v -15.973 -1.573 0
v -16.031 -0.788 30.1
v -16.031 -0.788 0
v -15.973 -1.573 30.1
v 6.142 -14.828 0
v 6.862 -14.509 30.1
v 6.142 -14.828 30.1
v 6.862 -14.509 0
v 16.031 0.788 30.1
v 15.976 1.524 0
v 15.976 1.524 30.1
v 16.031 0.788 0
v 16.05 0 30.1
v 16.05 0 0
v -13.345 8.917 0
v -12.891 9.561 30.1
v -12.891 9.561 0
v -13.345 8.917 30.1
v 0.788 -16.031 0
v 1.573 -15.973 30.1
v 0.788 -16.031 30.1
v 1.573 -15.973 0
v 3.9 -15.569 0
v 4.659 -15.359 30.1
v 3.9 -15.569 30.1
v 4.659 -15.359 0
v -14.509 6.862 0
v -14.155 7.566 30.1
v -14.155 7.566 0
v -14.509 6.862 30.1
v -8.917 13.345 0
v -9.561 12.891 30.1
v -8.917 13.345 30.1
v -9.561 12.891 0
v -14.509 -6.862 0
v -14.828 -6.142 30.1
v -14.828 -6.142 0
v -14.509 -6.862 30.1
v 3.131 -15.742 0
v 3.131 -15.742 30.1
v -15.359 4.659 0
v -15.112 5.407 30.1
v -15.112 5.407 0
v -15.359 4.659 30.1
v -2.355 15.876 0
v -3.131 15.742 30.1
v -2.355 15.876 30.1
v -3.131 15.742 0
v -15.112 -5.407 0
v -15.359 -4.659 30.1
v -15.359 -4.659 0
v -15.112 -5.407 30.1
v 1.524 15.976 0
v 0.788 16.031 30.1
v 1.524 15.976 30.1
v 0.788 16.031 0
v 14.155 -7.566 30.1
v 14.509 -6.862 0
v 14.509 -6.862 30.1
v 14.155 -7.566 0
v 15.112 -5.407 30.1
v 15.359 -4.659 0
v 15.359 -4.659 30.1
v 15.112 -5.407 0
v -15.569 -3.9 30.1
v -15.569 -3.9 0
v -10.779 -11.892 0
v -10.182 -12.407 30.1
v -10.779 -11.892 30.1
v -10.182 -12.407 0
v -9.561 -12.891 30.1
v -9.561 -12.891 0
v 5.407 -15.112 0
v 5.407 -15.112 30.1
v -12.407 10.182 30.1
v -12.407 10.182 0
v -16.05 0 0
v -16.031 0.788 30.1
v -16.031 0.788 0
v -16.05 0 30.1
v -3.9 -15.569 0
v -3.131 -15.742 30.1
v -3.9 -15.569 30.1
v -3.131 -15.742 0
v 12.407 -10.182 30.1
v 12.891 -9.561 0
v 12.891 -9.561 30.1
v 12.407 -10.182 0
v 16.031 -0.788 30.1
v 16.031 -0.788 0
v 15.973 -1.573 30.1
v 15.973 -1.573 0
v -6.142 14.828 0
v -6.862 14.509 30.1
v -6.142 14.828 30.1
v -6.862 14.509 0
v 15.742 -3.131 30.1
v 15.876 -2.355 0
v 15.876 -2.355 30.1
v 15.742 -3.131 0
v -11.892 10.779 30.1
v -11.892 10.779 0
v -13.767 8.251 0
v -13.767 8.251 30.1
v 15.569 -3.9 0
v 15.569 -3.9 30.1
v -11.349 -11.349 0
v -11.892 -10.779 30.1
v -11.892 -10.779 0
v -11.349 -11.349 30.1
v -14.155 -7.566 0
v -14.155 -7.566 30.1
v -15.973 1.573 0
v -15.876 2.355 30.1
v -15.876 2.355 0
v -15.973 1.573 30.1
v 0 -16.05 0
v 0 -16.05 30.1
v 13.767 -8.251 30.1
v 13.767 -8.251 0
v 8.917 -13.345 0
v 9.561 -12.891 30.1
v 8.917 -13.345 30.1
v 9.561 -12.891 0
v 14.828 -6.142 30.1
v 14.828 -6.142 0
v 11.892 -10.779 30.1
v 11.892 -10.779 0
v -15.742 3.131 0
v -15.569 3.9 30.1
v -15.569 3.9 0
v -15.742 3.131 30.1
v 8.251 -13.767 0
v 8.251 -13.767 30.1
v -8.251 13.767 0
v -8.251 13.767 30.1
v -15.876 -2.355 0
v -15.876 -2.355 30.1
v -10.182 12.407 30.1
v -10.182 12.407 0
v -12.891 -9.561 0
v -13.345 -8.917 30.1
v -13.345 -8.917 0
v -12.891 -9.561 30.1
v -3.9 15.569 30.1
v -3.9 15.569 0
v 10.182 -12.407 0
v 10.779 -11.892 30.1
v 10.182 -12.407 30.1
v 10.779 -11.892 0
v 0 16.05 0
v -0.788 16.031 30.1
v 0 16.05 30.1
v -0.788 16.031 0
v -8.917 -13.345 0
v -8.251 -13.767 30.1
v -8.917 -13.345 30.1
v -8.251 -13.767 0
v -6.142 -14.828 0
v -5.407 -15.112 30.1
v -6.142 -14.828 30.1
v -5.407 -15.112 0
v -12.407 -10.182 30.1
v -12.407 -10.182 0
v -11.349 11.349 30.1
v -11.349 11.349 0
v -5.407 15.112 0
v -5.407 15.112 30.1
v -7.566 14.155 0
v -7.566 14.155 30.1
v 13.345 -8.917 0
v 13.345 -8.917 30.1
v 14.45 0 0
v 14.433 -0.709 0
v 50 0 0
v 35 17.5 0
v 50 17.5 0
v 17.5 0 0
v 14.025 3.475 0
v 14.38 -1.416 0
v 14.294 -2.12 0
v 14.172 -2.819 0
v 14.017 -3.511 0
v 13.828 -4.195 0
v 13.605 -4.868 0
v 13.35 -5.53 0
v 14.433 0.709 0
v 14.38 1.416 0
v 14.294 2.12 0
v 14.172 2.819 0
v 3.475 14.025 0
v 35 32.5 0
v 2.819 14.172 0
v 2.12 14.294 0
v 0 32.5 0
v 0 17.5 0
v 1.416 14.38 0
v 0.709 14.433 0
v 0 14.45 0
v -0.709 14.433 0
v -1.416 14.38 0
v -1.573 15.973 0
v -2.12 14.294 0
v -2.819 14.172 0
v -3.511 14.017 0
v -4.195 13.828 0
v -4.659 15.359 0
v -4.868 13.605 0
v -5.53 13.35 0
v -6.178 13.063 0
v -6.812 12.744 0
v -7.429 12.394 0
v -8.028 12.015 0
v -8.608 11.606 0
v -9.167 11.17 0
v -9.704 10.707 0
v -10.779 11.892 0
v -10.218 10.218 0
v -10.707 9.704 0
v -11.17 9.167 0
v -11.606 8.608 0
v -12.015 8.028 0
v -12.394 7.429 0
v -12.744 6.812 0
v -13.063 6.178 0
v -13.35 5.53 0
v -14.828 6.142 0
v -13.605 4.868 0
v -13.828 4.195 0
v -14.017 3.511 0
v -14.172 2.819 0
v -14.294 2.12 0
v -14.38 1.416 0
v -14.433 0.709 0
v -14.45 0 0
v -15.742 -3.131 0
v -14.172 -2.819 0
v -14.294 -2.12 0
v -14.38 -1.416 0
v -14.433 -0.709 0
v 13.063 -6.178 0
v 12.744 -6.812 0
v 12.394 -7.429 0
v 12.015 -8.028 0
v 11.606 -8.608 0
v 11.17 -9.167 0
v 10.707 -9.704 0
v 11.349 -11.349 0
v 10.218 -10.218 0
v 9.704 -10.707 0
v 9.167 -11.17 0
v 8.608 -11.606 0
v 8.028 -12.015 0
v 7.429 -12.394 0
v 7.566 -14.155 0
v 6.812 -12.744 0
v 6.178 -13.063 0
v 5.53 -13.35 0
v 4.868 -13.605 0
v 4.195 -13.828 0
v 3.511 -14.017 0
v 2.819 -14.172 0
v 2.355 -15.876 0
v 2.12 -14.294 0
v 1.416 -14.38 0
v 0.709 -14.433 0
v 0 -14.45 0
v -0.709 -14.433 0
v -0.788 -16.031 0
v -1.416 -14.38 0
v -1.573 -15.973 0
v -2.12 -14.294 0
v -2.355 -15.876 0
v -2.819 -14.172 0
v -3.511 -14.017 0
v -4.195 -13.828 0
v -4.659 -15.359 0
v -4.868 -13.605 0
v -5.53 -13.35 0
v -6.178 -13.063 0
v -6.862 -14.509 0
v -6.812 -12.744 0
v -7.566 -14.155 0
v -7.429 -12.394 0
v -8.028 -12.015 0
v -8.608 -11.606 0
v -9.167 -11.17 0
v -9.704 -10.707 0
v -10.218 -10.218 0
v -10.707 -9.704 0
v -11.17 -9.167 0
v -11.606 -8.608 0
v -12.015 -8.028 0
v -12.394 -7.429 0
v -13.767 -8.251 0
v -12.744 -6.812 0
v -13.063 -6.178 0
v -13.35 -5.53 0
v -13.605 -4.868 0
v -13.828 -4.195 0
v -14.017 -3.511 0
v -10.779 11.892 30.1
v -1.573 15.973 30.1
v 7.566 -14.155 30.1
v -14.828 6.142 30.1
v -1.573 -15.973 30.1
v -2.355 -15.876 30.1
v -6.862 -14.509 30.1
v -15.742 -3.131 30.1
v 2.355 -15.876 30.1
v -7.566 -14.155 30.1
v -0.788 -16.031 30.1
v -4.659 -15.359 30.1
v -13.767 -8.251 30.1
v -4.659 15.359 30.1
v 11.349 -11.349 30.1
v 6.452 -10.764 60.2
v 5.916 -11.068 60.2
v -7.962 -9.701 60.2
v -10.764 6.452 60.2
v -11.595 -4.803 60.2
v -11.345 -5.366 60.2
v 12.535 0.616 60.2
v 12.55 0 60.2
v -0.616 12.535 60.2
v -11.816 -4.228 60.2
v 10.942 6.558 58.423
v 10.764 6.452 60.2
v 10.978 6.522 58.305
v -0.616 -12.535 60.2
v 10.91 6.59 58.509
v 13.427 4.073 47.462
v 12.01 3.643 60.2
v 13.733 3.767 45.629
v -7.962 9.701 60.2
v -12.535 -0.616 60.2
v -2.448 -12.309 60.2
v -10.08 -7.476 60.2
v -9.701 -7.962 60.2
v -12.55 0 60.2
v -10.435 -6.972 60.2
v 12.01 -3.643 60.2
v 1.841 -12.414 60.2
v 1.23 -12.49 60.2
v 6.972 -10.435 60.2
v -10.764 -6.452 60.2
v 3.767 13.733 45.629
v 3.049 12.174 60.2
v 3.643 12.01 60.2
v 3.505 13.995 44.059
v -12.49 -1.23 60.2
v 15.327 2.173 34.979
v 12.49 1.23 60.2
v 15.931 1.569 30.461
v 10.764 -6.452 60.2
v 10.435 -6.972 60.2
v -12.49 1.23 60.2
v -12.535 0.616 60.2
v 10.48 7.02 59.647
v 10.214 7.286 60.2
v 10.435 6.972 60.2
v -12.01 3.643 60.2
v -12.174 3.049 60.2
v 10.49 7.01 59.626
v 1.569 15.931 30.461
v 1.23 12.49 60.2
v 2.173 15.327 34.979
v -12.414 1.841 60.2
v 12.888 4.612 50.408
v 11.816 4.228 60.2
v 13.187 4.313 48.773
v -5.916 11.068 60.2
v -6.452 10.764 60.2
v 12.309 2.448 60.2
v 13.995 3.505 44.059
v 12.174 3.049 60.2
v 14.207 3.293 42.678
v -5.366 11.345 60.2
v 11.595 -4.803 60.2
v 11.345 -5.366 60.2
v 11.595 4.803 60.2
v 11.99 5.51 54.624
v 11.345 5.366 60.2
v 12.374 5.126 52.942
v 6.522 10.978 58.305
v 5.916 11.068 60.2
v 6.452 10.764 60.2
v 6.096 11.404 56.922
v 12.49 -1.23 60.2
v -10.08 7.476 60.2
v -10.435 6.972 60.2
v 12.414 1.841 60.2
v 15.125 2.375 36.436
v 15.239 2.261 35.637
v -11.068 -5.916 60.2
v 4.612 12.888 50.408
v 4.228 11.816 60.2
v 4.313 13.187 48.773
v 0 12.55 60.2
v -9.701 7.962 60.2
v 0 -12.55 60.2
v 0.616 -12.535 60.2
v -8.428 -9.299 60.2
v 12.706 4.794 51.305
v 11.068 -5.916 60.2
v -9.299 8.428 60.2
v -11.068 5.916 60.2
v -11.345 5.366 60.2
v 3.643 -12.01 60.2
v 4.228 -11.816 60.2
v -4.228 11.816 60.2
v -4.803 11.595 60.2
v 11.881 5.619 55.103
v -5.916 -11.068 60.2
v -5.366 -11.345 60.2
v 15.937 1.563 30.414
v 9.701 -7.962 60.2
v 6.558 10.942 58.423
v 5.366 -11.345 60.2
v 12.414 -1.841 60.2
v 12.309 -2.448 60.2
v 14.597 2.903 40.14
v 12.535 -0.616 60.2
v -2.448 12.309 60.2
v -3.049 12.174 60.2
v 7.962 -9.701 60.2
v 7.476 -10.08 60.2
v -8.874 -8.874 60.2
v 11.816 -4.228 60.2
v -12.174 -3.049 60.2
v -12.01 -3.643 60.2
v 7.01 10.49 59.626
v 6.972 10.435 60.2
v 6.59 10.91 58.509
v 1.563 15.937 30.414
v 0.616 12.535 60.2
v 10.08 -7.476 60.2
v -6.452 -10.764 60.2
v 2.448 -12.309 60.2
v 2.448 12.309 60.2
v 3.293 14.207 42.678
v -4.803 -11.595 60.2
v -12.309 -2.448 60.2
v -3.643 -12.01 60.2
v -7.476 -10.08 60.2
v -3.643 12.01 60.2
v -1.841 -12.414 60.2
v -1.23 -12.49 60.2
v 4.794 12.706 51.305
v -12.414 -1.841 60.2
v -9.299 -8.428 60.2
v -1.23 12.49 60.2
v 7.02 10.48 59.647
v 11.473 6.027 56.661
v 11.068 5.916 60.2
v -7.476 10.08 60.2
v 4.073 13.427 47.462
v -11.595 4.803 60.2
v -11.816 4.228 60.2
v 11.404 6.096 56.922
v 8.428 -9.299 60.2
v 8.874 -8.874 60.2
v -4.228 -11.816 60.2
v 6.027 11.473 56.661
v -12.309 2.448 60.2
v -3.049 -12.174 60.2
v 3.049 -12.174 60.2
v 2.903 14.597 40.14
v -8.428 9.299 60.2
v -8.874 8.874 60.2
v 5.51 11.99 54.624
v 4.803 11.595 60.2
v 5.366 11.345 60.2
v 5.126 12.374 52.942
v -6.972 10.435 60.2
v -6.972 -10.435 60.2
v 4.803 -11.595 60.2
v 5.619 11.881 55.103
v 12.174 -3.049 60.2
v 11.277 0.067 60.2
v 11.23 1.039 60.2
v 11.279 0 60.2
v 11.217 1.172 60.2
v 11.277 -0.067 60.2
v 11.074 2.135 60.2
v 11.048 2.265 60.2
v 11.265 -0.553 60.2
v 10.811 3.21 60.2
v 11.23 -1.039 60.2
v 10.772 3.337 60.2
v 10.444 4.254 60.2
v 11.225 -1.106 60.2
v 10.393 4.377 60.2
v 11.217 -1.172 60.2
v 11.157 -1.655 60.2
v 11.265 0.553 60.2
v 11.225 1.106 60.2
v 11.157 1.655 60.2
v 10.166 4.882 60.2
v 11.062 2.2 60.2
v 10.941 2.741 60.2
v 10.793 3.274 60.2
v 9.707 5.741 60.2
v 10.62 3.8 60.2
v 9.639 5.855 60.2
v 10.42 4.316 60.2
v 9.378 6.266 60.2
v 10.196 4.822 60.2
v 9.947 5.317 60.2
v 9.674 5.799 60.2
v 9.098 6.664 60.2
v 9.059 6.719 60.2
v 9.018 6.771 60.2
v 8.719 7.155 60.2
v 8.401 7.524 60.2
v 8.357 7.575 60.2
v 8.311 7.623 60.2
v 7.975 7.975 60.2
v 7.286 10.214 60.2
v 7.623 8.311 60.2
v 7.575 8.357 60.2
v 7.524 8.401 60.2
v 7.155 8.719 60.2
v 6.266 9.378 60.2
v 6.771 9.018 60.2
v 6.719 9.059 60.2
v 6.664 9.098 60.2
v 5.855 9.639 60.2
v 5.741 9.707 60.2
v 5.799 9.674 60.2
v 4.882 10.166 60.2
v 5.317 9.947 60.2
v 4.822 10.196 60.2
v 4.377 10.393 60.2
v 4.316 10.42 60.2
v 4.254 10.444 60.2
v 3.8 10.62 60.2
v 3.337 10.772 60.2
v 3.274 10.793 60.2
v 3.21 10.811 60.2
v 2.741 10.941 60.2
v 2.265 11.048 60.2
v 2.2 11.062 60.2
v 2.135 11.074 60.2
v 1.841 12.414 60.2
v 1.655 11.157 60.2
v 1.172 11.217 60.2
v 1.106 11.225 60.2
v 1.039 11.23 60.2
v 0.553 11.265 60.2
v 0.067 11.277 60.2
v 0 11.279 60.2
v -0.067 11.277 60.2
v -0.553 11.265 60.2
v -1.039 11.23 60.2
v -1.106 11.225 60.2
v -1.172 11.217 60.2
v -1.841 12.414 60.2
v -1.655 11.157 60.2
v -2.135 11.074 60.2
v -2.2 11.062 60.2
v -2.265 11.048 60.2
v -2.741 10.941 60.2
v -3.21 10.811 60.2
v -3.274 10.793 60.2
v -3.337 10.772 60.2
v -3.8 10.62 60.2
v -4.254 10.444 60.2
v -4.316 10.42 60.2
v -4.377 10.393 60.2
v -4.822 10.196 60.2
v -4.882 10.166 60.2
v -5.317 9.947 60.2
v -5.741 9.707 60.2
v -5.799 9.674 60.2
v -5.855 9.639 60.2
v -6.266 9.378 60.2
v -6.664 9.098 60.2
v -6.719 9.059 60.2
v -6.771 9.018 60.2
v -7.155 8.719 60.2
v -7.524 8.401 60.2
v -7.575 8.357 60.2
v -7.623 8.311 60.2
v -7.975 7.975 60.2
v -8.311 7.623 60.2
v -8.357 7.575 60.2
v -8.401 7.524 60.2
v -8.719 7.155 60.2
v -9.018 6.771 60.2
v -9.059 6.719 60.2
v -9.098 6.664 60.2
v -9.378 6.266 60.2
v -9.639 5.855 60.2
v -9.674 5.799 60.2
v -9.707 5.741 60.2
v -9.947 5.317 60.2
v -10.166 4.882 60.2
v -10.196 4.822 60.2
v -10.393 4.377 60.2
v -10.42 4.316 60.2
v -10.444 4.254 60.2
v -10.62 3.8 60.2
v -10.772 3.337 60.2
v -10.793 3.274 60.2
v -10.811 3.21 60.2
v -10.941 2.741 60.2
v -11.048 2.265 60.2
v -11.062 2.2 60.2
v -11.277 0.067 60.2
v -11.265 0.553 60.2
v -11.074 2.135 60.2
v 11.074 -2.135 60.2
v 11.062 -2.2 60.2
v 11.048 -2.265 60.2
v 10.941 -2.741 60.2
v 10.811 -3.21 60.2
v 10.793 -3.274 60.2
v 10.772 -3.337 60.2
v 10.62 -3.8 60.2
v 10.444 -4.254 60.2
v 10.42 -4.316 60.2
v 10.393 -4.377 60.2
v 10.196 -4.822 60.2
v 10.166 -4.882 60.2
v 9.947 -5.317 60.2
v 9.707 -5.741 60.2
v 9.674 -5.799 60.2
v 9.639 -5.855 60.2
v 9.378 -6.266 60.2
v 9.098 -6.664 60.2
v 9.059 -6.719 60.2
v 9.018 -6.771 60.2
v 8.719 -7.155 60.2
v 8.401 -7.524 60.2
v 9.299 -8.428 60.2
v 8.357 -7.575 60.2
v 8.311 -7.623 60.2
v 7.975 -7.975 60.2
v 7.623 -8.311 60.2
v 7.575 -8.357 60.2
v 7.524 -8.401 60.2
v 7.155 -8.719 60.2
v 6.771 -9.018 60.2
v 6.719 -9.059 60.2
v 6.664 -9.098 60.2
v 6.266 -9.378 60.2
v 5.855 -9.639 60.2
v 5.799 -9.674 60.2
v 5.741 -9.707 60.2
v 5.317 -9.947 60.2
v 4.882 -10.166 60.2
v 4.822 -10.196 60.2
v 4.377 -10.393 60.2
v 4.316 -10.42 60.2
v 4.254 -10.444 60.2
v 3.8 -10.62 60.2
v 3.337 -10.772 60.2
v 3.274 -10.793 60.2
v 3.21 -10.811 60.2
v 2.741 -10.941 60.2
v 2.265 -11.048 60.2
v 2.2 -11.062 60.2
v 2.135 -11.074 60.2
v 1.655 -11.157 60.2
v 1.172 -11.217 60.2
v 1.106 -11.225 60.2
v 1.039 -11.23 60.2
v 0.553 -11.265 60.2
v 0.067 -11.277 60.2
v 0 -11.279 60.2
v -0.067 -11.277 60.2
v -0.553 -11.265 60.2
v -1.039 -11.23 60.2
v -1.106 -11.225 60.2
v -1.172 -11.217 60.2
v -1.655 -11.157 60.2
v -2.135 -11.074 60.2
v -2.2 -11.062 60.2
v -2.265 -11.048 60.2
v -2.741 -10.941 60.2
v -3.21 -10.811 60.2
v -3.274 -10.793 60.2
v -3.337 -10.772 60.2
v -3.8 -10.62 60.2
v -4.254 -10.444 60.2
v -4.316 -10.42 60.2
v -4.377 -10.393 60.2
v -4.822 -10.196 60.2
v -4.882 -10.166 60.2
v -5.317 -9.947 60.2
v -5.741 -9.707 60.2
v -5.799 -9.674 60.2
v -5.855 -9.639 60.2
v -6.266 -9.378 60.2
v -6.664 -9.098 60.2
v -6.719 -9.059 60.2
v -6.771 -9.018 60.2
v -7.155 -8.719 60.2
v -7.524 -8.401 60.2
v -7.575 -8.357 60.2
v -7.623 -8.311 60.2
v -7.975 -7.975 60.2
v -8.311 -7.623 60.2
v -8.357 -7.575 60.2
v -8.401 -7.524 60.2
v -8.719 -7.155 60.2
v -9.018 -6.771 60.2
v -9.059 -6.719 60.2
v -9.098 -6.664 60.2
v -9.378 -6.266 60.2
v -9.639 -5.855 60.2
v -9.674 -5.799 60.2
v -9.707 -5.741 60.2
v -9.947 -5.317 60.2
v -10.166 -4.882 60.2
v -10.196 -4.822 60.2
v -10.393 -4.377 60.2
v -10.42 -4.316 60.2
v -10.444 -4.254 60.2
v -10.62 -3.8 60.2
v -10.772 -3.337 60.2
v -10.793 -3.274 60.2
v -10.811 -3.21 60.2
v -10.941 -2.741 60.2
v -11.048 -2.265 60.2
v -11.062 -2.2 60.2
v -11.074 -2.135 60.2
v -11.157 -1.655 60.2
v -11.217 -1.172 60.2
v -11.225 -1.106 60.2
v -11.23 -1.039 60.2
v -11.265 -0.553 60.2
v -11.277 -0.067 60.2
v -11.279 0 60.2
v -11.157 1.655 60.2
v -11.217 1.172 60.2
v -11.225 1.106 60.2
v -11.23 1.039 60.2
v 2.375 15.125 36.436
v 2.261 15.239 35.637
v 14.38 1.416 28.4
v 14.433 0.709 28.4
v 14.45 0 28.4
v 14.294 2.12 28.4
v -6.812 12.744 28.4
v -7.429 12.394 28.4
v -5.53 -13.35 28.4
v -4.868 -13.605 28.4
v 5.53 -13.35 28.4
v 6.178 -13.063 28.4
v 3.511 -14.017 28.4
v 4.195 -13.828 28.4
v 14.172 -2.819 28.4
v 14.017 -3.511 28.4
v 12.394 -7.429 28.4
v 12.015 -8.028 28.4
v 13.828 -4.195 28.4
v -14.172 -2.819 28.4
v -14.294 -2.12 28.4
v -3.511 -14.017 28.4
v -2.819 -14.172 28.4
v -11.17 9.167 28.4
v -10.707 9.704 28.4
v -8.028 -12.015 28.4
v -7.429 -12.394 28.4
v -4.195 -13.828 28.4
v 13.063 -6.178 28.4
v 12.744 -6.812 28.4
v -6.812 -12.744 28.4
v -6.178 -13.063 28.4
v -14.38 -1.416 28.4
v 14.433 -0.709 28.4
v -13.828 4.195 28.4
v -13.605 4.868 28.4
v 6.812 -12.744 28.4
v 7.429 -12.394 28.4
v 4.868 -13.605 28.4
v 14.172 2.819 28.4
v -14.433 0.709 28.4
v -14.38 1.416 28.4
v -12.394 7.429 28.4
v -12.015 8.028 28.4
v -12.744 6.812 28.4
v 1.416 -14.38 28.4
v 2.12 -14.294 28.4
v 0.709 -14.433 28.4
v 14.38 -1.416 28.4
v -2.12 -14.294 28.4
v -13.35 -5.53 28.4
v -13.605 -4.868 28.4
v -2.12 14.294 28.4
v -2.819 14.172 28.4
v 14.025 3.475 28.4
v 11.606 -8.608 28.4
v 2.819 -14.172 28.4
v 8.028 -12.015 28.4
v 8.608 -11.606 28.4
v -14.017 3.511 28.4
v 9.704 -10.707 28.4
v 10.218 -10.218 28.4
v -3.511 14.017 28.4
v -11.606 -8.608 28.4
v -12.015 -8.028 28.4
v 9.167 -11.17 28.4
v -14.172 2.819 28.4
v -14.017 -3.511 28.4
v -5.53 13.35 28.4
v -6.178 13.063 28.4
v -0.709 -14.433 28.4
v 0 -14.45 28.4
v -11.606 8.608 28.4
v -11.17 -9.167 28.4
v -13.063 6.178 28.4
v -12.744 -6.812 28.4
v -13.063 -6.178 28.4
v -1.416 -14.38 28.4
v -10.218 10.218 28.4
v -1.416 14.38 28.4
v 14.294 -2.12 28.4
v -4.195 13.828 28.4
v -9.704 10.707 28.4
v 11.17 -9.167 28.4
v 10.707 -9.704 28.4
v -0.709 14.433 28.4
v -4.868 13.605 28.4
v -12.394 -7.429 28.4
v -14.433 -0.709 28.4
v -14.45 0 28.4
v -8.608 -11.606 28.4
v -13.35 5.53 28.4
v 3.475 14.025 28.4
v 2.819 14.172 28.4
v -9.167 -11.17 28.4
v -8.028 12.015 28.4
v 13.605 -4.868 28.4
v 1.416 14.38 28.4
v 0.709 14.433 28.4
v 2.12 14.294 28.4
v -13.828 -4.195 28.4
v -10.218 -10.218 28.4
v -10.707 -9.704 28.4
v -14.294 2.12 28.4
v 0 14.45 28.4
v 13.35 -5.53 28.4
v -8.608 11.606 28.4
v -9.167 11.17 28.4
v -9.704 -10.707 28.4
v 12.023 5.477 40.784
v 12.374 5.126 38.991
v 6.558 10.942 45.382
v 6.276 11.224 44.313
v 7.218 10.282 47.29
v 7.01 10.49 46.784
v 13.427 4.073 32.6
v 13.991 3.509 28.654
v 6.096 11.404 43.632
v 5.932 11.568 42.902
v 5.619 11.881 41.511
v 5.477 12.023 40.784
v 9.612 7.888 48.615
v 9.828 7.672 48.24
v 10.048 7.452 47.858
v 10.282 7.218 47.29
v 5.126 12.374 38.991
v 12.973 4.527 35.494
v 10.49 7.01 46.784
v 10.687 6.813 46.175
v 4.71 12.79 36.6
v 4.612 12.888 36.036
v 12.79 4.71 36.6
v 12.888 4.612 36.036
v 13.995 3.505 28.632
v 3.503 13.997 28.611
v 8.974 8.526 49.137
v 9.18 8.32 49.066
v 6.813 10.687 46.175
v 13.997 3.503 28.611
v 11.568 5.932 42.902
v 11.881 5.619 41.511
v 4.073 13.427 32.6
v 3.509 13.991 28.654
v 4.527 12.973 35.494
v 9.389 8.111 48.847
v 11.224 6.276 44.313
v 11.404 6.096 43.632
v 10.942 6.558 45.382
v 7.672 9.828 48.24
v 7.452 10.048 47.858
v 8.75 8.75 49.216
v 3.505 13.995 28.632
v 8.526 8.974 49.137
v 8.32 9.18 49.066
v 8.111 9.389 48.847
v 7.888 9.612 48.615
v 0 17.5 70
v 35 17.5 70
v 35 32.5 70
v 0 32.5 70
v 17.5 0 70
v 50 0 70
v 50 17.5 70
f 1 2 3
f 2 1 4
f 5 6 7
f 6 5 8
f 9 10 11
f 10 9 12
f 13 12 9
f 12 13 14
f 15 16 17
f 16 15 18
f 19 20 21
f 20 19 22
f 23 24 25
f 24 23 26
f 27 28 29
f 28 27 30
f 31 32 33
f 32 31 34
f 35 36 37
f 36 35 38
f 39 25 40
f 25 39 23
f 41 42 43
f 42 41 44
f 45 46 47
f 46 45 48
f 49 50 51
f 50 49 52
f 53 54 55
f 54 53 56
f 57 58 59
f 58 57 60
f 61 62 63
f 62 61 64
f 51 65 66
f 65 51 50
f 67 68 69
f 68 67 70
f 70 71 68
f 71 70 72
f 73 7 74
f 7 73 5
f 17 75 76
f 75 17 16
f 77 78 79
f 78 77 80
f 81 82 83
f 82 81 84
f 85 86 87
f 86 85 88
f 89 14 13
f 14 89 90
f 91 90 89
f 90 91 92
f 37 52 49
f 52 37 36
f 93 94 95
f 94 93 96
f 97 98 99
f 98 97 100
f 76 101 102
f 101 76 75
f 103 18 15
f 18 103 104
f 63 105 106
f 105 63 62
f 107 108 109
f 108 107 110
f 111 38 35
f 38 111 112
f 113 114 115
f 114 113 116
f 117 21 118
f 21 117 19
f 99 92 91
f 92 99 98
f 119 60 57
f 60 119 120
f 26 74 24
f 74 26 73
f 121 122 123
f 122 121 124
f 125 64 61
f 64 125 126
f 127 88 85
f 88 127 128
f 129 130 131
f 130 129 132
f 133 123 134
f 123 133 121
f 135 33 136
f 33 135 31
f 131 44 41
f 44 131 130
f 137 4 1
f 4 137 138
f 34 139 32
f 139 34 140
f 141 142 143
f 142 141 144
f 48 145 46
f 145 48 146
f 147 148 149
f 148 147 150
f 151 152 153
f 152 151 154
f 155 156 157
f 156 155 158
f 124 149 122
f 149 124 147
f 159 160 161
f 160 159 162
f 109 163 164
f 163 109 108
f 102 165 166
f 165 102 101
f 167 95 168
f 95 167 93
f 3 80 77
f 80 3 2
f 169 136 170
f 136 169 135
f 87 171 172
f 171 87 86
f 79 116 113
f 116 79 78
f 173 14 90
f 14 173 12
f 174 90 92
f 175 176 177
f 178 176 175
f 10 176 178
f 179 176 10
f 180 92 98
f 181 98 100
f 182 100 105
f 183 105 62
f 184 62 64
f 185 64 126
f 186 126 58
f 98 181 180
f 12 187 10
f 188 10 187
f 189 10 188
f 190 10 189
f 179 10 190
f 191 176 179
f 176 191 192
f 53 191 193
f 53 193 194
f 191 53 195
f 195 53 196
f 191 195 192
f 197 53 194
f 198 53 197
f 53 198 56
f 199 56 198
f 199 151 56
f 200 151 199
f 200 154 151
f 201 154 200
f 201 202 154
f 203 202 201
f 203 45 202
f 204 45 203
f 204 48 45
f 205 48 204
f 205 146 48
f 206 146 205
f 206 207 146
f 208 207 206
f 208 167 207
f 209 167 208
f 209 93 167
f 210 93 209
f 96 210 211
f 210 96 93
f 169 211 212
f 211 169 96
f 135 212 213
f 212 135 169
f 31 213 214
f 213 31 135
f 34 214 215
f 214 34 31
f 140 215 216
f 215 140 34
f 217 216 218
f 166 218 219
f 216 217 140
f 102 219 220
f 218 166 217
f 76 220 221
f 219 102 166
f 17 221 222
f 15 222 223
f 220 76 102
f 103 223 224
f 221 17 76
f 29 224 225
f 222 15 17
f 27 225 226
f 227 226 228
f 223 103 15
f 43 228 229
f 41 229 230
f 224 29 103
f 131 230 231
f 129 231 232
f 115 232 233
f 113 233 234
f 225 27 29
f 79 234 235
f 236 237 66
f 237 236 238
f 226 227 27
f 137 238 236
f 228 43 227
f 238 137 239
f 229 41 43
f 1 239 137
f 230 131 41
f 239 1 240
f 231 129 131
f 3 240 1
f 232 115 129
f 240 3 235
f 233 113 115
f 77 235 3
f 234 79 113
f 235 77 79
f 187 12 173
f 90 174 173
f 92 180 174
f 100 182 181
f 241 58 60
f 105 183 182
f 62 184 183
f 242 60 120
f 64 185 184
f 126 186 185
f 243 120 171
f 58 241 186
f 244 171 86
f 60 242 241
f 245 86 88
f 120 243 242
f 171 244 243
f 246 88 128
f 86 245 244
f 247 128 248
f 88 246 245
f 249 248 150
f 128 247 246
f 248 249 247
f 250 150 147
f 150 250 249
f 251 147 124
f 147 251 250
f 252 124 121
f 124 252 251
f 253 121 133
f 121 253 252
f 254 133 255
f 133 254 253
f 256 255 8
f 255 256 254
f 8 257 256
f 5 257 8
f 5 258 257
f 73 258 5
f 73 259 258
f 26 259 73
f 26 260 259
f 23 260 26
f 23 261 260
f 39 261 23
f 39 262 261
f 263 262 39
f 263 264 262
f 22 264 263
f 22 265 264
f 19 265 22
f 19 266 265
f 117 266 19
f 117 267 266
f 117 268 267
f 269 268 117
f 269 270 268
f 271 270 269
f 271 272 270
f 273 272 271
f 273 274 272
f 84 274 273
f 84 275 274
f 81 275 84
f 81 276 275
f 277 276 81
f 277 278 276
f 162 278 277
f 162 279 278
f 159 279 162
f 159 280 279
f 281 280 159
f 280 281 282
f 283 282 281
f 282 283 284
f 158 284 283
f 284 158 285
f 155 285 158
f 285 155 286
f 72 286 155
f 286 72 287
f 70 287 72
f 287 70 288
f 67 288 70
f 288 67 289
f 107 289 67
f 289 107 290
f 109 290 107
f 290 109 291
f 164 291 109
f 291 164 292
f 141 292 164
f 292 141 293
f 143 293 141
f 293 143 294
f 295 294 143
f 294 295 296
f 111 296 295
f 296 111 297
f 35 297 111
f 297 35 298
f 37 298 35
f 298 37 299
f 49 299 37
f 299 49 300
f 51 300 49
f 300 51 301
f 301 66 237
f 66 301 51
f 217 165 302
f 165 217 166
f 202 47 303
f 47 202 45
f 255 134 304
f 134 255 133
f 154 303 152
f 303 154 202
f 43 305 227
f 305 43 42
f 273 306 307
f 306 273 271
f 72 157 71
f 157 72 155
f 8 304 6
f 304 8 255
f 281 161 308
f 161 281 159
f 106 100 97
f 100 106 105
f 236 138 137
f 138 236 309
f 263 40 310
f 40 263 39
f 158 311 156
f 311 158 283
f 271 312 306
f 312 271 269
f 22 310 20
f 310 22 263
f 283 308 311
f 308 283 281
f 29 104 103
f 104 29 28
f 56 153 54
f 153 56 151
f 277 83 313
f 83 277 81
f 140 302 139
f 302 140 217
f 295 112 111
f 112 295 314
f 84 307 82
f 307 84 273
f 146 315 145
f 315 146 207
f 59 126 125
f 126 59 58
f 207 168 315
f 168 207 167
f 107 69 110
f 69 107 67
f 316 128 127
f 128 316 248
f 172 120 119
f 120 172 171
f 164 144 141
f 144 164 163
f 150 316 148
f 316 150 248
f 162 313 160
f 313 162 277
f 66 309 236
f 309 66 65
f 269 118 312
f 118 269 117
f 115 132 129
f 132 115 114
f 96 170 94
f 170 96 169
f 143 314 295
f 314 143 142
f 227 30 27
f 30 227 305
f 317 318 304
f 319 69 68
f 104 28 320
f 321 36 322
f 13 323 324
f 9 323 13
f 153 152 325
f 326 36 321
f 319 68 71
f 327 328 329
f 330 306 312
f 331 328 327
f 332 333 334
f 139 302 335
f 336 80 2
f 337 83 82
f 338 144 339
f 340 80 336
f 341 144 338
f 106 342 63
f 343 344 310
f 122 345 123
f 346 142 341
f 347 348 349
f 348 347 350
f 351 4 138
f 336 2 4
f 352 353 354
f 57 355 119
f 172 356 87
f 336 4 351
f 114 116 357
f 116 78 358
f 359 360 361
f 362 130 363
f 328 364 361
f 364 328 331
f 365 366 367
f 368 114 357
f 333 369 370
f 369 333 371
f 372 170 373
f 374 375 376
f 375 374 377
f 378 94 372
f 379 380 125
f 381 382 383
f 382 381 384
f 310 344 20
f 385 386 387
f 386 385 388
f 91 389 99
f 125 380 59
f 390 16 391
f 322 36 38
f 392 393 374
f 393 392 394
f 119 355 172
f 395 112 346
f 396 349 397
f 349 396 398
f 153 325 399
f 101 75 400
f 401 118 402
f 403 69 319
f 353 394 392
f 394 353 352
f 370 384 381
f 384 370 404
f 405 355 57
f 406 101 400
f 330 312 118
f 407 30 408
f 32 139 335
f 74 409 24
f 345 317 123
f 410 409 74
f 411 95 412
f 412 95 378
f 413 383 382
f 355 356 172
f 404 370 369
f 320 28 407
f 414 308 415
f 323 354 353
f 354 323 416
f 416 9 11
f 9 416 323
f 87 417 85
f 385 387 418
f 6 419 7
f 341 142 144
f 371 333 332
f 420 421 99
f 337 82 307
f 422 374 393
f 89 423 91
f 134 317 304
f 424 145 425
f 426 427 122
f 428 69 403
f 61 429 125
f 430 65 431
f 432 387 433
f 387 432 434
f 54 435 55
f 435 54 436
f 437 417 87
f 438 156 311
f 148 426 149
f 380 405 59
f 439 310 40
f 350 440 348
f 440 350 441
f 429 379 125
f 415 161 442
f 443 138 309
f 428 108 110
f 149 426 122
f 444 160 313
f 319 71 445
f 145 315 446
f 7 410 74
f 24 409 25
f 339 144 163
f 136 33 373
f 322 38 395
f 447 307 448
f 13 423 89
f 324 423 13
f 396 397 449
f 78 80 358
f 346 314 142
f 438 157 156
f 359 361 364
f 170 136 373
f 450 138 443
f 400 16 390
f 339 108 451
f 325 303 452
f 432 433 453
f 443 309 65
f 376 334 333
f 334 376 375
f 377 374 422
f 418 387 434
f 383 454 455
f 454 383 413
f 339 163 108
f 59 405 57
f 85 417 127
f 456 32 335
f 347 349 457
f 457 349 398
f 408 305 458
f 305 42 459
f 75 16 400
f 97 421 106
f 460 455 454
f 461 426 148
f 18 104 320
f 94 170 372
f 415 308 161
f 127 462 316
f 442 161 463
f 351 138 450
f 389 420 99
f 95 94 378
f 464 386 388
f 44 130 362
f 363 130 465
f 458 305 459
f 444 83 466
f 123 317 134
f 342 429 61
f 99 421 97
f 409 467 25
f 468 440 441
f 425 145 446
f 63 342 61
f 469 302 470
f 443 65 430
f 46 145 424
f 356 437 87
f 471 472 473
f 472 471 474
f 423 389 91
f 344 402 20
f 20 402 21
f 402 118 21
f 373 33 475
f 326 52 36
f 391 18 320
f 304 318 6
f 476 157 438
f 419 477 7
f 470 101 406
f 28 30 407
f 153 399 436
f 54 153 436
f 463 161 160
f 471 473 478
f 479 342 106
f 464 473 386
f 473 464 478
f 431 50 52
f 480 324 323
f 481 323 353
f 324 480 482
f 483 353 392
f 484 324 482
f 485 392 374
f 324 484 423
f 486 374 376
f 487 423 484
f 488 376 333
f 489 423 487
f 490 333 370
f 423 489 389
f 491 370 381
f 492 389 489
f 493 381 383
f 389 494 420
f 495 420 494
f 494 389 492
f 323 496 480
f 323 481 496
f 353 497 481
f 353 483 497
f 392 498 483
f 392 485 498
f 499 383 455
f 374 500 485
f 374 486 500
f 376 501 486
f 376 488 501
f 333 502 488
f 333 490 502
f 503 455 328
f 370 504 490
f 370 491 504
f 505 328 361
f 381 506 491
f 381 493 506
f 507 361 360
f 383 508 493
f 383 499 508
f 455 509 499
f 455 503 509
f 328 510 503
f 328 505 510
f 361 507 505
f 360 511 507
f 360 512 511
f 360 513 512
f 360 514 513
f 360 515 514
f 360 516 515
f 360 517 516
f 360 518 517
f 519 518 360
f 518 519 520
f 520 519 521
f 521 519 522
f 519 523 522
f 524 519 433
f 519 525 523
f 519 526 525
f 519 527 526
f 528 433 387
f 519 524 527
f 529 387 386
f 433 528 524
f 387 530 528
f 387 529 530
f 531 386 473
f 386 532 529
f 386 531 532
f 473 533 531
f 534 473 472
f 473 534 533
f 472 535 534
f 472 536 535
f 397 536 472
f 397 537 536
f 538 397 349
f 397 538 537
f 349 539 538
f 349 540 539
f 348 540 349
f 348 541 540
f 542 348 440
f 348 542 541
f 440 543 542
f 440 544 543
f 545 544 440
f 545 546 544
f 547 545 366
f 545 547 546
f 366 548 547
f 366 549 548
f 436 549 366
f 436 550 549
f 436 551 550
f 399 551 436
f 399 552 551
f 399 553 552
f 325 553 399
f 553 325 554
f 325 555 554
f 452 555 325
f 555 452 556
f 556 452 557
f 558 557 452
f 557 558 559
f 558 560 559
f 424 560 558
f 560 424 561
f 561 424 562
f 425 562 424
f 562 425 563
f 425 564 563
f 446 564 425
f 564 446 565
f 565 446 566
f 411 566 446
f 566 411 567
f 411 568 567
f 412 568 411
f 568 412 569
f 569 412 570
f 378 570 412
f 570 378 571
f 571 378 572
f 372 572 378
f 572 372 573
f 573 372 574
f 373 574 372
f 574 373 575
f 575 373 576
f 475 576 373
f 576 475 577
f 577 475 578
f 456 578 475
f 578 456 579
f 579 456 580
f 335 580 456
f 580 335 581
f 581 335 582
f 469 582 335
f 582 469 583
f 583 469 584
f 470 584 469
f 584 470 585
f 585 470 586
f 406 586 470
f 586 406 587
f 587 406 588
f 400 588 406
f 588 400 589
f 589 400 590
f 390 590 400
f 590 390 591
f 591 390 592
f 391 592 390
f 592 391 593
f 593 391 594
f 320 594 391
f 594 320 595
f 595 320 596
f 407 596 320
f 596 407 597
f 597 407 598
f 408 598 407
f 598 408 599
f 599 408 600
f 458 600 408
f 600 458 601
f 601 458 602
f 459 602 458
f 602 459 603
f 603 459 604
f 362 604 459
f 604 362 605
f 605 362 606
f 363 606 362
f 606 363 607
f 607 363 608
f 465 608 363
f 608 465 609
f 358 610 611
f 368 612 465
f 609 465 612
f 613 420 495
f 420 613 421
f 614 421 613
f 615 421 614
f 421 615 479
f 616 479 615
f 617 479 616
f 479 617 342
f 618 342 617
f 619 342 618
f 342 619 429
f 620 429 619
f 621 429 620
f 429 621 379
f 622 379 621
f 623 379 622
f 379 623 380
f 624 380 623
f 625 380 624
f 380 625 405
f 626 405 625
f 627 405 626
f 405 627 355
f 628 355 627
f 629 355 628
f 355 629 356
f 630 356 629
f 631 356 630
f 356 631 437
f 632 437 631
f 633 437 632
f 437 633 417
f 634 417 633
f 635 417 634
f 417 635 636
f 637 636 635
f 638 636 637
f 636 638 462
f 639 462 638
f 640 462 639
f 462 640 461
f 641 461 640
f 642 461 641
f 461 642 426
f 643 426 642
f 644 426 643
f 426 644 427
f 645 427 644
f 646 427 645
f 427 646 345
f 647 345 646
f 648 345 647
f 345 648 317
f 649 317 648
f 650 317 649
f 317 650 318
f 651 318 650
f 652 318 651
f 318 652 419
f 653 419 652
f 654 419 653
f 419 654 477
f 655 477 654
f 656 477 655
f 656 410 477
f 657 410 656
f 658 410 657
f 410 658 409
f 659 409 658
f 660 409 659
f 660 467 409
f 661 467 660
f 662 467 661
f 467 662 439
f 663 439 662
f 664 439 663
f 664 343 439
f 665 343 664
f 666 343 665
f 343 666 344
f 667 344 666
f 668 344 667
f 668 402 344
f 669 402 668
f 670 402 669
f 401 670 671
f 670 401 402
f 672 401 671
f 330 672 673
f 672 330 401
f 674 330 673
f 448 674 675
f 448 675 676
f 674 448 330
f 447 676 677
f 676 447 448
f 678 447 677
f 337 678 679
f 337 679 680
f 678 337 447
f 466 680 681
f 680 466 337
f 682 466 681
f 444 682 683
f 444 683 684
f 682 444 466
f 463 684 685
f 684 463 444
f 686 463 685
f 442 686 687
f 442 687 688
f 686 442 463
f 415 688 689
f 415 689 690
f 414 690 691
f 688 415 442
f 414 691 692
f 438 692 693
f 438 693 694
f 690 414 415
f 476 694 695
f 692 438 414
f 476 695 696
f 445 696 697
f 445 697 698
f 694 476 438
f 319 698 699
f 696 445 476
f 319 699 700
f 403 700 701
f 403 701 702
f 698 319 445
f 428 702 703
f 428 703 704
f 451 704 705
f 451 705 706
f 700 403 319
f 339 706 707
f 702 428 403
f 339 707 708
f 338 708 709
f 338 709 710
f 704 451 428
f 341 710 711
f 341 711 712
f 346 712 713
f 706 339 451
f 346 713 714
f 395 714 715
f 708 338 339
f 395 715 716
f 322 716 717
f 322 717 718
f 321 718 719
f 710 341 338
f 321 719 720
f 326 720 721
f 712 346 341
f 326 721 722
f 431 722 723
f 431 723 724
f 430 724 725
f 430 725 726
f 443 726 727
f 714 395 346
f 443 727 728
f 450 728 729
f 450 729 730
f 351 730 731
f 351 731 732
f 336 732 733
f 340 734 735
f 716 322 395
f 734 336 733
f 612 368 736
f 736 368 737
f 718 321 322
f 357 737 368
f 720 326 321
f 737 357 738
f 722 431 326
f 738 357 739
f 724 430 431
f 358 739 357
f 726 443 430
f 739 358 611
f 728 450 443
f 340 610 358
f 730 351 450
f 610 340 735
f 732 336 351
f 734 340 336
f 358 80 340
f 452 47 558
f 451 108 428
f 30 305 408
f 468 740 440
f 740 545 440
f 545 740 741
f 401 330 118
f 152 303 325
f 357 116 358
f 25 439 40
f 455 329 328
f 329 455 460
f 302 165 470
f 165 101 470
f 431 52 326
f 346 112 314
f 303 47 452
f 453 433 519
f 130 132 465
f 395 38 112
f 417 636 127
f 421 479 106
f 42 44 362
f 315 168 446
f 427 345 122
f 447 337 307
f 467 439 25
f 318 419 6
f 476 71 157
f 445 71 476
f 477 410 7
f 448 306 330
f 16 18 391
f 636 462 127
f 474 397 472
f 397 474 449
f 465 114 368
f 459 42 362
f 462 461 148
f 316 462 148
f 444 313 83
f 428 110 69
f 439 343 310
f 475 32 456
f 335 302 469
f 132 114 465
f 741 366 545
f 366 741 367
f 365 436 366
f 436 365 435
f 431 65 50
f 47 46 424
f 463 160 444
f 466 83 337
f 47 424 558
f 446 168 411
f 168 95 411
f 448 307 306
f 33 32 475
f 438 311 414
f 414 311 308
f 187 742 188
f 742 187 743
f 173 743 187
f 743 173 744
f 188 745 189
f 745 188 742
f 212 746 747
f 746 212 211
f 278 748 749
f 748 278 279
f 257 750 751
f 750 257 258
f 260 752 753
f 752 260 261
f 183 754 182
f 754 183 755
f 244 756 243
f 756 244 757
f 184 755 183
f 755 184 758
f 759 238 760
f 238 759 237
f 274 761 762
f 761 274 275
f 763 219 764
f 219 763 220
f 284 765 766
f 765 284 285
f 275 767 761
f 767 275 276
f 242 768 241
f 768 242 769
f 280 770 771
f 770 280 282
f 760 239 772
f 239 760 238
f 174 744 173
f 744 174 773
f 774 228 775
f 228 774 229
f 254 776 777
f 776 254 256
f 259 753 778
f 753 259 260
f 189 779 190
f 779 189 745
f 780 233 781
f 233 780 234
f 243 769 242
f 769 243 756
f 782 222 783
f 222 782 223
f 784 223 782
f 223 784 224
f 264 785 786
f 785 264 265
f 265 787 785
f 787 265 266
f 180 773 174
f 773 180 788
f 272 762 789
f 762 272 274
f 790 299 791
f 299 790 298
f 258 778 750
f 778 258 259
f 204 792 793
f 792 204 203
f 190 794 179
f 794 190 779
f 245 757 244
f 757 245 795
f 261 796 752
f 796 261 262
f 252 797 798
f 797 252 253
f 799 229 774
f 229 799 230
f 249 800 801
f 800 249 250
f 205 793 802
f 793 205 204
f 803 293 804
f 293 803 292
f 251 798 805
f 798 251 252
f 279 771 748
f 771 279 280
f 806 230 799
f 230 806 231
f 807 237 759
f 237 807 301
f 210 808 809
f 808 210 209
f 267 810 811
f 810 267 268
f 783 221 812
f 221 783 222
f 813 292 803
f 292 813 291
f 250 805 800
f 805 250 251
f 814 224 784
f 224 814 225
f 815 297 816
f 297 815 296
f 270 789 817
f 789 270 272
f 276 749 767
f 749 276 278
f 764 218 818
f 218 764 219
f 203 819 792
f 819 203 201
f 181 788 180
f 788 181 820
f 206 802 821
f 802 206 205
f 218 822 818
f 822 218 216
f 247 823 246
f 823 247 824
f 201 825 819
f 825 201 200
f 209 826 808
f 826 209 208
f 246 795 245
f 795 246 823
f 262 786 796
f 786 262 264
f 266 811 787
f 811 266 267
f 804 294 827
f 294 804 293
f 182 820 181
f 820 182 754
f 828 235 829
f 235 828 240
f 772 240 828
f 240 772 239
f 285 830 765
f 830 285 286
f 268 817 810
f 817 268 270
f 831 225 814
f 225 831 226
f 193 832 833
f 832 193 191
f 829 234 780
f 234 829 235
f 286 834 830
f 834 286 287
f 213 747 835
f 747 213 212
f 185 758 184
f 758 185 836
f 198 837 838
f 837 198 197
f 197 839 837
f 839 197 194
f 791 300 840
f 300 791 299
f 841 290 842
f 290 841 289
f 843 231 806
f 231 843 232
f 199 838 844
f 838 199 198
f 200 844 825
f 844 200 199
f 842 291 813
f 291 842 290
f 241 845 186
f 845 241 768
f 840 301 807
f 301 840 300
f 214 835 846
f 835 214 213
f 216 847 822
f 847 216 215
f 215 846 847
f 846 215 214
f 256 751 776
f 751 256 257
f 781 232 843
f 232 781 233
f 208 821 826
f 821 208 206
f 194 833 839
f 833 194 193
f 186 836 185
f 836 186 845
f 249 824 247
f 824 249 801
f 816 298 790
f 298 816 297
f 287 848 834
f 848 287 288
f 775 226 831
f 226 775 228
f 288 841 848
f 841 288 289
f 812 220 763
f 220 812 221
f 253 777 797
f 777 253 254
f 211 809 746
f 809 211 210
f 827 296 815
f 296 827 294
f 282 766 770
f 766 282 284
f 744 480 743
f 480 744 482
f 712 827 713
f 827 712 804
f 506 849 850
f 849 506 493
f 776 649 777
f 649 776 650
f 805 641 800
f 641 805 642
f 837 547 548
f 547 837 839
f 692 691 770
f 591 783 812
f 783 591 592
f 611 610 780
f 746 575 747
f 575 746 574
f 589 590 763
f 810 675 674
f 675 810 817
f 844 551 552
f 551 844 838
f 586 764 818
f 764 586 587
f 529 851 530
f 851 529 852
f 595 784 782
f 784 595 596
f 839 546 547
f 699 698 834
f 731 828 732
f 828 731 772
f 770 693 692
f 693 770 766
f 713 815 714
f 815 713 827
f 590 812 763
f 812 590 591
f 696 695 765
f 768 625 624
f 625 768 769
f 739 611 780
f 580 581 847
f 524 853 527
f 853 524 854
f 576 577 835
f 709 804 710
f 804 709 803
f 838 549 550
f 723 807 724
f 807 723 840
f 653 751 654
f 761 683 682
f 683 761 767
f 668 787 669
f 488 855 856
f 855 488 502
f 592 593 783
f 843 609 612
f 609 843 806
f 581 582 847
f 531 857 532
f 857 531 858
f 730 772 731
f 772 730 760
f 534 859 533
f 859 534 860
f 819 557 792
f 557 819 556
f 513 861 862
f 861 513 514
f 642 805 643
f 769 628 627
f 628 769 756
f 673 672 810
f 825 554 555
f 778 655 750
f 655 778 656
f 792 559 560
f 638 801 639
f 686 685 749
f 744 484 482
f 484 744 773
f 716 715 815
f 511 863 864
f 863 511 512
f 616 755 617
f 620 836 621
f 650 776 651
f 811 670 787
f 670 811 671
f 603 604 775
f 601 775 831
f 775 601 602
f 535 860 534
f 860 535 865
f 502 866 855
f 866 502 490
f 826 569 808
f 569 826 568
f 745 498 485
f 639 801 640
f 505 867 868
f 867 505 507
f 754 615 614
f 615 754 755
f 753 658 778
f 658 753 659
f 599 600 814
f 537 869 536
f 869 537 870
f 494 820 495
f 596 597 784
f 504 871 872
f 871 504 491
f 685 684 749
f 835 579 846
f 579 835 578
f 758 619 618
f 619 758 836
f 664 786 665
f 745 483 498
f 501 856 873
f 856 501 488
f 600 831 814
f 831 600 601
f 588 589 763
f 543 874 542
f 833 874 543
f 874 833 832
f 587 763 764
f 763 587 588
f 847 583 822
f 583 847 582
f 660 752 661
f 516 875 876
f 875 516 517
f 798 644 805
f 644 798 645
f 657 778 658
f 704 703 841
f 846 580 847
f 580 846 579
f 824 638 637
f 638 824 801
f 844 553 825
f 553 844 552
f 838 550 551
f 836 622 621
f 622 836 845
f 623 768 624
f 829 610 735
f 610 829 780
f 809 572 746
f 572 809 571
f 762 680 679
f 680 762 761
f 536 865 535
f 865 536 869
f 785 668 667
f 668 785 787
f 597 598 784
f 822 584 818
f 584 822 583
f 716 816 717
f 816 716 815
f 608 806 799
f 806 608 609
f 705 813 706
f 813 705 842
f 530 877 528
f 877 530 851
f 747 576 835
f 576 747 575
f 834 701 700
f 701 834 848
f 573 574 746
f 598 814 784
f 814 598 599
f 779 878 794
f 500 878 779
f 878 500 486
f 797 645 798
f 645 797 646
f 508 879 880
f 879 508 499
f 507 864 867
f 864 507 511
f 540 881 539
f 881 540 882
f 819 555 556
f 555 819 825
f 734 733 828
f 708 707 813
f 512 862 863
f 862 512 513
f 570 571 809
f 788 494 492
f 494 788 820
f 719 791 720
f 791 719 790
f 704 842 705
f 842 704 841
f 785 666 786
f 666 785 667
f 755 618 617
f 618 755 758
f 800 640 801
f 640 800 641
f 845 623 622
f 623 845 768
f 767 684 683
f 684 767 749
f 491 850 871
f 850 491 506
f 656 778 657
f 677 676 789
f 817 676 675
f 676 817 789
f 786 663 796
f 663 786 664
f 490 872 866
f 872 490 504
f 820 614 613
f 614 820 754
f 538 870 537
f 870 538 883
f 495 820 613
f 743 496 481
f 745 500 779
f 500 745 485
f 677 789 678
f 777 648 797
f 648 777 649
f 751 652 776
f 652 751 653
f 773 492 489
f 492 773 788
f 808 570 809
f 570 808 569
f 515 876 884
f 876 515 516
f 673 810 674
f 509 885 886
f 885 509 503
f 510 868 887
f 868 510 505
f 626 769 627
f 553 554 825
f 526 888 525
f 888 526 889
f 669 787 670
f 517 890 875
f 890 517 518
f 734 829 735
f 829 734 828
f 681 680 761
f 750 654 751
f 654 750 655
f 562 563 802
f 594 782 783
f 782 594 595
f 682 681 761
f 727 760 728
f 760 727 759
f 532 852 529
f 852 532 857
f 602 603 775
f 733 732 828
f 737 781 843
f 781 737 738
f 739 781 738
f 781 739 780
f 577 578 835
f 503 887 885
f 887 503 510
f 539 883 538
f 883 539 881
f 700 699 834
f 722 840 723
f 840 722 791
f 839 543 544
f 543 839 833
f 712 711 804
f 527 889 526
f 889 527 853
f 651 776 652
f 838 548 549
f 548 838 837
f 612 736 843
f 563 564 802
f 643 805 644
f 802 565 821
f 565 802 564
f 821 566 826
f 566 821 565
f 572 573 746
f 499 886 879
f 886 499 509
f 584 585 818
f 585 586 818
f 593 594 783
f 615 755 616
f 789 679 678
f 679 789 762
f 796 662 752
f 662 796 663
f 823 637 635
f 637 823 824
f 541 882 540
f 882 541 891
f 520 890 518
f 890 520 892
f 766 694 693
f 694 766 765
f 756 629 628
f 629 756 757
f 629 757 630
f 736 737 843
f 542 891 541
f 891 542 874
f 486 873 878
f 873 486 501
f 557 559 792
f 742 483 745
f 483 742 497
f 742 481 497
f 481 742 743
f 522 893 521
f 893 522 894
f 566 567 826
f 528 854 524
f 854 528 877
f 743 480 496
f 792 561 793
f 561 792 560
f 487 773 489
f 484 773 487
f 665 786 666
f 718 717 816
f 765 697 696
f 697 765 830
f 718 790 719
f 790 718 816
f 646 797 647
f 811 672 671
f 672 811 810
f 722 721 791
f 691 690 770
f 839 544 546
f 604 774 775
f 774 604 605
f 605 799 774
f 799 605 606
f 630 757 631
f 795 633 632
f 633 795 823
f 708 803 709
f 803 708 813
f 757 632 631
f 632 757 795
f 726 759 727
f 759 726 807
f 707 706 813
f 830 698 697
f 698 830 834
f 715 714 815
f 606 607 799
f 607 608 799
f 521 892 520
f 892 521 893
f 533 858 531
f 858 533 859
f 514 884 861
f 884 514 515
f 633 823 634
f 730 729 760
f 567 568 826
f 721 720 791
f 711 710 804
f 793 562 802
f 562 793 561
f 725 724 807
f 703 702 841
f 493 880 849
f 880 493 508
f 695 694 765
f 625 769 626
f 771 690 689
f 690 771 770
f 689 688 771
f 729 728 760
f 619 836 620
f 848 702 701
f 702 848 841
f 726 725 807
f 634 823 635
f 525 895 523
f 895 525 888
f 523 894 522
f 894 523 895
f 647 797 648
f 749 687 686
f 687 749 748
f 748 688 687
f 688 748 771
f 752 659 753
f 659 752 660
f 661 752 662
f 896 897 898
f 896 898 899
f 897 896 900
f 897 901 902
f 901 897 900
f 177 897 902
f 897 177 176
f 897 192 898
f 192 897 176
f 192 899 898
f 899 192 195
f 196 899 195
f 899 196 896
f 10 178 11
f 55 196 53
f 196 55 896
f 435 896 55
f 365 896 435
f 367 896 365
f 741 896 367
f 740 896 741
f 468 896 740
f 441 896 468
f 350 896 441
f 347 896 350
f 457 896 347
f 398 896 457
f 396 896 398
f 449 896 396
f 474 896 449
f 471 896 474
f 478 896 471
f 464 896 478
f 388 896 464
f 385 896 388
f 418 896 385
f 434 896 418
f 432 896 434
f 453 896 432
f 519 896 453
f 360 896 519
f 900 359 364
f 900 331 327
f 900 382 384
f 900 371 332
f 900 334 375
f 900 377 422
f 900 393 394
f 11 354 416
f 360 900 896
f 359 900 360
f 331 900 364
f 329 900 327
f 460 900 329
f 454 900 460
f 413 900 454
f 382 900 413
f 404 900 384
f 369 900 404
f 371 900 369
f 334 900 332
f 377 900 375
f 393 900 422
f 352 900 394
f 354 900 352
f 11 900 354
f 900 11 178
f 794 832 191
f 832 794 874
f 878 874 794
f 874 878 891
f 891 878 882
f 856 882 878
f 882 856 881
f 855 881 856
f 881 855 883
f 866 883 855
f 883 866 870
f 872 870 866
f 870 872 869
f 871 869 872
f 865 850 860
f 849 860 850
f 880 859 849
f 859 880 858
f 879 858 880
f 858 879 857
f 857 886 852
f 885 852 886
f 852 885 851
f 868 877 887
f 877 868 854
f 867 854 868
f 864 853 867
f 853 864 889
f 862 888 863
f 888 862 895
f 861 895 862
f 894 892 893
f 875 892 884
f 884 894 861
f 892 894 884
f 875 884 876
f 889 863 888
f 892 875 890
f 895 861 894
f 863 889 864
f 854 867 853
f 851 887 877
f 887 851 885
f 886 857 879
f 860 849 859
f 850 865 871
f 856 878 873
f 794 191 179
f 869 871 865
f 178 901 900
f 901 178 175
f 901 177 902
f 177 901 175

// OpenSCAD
include <BOSL2/std.scad>

box = [315, 280, 70];
item = [245, 245, box.z];
spacer_overhang = 15;

min_extents = (box - item) / 2;
max_extents = add_scalar(min_extents, spacer_overhang);

chamfer_size = min(min_extents.x, min_extents.y);

echo(min_extents);
echo(max_extents);

module spacer_polygon() {
    polygon(points = [
        // counterclockwise from outside corner
            [chamfer_size, 0], // origin - outside corner
            [max_extents.x, 0], // outside
            [max_extents.x, min_extents.y], // inside, end of spacer
            [min_extents.x, min_extents.y], // inner corner
            [min_extents.x, max_extents.y], // inside, end of spacer
            [0, max_extents.y], // outside
            [0, chamfer_size]
        ]);
}

module spacer() {
    linear_extrude(height = box.z)
        spacer_polygon();
}

module spacer_bottom_left() {
    spacer();
}

module spacer_bottom_right() {
    xflip(x=box.x / 2)
    spacer();
}

module spacer_top_left() {
    yflip(y=box.y / 2)
    spacer();
}

module spacer_top_right() {
    yflip(y=box.y / 2)
    xflip(x=box.x / 2)
    spacer();
}

module all_spacers() {
    spacer_bottom_left();
//    spacer_bottom_right();
//    spacer_top_left();
//    spacer_top_right();
}

all_spacers();
